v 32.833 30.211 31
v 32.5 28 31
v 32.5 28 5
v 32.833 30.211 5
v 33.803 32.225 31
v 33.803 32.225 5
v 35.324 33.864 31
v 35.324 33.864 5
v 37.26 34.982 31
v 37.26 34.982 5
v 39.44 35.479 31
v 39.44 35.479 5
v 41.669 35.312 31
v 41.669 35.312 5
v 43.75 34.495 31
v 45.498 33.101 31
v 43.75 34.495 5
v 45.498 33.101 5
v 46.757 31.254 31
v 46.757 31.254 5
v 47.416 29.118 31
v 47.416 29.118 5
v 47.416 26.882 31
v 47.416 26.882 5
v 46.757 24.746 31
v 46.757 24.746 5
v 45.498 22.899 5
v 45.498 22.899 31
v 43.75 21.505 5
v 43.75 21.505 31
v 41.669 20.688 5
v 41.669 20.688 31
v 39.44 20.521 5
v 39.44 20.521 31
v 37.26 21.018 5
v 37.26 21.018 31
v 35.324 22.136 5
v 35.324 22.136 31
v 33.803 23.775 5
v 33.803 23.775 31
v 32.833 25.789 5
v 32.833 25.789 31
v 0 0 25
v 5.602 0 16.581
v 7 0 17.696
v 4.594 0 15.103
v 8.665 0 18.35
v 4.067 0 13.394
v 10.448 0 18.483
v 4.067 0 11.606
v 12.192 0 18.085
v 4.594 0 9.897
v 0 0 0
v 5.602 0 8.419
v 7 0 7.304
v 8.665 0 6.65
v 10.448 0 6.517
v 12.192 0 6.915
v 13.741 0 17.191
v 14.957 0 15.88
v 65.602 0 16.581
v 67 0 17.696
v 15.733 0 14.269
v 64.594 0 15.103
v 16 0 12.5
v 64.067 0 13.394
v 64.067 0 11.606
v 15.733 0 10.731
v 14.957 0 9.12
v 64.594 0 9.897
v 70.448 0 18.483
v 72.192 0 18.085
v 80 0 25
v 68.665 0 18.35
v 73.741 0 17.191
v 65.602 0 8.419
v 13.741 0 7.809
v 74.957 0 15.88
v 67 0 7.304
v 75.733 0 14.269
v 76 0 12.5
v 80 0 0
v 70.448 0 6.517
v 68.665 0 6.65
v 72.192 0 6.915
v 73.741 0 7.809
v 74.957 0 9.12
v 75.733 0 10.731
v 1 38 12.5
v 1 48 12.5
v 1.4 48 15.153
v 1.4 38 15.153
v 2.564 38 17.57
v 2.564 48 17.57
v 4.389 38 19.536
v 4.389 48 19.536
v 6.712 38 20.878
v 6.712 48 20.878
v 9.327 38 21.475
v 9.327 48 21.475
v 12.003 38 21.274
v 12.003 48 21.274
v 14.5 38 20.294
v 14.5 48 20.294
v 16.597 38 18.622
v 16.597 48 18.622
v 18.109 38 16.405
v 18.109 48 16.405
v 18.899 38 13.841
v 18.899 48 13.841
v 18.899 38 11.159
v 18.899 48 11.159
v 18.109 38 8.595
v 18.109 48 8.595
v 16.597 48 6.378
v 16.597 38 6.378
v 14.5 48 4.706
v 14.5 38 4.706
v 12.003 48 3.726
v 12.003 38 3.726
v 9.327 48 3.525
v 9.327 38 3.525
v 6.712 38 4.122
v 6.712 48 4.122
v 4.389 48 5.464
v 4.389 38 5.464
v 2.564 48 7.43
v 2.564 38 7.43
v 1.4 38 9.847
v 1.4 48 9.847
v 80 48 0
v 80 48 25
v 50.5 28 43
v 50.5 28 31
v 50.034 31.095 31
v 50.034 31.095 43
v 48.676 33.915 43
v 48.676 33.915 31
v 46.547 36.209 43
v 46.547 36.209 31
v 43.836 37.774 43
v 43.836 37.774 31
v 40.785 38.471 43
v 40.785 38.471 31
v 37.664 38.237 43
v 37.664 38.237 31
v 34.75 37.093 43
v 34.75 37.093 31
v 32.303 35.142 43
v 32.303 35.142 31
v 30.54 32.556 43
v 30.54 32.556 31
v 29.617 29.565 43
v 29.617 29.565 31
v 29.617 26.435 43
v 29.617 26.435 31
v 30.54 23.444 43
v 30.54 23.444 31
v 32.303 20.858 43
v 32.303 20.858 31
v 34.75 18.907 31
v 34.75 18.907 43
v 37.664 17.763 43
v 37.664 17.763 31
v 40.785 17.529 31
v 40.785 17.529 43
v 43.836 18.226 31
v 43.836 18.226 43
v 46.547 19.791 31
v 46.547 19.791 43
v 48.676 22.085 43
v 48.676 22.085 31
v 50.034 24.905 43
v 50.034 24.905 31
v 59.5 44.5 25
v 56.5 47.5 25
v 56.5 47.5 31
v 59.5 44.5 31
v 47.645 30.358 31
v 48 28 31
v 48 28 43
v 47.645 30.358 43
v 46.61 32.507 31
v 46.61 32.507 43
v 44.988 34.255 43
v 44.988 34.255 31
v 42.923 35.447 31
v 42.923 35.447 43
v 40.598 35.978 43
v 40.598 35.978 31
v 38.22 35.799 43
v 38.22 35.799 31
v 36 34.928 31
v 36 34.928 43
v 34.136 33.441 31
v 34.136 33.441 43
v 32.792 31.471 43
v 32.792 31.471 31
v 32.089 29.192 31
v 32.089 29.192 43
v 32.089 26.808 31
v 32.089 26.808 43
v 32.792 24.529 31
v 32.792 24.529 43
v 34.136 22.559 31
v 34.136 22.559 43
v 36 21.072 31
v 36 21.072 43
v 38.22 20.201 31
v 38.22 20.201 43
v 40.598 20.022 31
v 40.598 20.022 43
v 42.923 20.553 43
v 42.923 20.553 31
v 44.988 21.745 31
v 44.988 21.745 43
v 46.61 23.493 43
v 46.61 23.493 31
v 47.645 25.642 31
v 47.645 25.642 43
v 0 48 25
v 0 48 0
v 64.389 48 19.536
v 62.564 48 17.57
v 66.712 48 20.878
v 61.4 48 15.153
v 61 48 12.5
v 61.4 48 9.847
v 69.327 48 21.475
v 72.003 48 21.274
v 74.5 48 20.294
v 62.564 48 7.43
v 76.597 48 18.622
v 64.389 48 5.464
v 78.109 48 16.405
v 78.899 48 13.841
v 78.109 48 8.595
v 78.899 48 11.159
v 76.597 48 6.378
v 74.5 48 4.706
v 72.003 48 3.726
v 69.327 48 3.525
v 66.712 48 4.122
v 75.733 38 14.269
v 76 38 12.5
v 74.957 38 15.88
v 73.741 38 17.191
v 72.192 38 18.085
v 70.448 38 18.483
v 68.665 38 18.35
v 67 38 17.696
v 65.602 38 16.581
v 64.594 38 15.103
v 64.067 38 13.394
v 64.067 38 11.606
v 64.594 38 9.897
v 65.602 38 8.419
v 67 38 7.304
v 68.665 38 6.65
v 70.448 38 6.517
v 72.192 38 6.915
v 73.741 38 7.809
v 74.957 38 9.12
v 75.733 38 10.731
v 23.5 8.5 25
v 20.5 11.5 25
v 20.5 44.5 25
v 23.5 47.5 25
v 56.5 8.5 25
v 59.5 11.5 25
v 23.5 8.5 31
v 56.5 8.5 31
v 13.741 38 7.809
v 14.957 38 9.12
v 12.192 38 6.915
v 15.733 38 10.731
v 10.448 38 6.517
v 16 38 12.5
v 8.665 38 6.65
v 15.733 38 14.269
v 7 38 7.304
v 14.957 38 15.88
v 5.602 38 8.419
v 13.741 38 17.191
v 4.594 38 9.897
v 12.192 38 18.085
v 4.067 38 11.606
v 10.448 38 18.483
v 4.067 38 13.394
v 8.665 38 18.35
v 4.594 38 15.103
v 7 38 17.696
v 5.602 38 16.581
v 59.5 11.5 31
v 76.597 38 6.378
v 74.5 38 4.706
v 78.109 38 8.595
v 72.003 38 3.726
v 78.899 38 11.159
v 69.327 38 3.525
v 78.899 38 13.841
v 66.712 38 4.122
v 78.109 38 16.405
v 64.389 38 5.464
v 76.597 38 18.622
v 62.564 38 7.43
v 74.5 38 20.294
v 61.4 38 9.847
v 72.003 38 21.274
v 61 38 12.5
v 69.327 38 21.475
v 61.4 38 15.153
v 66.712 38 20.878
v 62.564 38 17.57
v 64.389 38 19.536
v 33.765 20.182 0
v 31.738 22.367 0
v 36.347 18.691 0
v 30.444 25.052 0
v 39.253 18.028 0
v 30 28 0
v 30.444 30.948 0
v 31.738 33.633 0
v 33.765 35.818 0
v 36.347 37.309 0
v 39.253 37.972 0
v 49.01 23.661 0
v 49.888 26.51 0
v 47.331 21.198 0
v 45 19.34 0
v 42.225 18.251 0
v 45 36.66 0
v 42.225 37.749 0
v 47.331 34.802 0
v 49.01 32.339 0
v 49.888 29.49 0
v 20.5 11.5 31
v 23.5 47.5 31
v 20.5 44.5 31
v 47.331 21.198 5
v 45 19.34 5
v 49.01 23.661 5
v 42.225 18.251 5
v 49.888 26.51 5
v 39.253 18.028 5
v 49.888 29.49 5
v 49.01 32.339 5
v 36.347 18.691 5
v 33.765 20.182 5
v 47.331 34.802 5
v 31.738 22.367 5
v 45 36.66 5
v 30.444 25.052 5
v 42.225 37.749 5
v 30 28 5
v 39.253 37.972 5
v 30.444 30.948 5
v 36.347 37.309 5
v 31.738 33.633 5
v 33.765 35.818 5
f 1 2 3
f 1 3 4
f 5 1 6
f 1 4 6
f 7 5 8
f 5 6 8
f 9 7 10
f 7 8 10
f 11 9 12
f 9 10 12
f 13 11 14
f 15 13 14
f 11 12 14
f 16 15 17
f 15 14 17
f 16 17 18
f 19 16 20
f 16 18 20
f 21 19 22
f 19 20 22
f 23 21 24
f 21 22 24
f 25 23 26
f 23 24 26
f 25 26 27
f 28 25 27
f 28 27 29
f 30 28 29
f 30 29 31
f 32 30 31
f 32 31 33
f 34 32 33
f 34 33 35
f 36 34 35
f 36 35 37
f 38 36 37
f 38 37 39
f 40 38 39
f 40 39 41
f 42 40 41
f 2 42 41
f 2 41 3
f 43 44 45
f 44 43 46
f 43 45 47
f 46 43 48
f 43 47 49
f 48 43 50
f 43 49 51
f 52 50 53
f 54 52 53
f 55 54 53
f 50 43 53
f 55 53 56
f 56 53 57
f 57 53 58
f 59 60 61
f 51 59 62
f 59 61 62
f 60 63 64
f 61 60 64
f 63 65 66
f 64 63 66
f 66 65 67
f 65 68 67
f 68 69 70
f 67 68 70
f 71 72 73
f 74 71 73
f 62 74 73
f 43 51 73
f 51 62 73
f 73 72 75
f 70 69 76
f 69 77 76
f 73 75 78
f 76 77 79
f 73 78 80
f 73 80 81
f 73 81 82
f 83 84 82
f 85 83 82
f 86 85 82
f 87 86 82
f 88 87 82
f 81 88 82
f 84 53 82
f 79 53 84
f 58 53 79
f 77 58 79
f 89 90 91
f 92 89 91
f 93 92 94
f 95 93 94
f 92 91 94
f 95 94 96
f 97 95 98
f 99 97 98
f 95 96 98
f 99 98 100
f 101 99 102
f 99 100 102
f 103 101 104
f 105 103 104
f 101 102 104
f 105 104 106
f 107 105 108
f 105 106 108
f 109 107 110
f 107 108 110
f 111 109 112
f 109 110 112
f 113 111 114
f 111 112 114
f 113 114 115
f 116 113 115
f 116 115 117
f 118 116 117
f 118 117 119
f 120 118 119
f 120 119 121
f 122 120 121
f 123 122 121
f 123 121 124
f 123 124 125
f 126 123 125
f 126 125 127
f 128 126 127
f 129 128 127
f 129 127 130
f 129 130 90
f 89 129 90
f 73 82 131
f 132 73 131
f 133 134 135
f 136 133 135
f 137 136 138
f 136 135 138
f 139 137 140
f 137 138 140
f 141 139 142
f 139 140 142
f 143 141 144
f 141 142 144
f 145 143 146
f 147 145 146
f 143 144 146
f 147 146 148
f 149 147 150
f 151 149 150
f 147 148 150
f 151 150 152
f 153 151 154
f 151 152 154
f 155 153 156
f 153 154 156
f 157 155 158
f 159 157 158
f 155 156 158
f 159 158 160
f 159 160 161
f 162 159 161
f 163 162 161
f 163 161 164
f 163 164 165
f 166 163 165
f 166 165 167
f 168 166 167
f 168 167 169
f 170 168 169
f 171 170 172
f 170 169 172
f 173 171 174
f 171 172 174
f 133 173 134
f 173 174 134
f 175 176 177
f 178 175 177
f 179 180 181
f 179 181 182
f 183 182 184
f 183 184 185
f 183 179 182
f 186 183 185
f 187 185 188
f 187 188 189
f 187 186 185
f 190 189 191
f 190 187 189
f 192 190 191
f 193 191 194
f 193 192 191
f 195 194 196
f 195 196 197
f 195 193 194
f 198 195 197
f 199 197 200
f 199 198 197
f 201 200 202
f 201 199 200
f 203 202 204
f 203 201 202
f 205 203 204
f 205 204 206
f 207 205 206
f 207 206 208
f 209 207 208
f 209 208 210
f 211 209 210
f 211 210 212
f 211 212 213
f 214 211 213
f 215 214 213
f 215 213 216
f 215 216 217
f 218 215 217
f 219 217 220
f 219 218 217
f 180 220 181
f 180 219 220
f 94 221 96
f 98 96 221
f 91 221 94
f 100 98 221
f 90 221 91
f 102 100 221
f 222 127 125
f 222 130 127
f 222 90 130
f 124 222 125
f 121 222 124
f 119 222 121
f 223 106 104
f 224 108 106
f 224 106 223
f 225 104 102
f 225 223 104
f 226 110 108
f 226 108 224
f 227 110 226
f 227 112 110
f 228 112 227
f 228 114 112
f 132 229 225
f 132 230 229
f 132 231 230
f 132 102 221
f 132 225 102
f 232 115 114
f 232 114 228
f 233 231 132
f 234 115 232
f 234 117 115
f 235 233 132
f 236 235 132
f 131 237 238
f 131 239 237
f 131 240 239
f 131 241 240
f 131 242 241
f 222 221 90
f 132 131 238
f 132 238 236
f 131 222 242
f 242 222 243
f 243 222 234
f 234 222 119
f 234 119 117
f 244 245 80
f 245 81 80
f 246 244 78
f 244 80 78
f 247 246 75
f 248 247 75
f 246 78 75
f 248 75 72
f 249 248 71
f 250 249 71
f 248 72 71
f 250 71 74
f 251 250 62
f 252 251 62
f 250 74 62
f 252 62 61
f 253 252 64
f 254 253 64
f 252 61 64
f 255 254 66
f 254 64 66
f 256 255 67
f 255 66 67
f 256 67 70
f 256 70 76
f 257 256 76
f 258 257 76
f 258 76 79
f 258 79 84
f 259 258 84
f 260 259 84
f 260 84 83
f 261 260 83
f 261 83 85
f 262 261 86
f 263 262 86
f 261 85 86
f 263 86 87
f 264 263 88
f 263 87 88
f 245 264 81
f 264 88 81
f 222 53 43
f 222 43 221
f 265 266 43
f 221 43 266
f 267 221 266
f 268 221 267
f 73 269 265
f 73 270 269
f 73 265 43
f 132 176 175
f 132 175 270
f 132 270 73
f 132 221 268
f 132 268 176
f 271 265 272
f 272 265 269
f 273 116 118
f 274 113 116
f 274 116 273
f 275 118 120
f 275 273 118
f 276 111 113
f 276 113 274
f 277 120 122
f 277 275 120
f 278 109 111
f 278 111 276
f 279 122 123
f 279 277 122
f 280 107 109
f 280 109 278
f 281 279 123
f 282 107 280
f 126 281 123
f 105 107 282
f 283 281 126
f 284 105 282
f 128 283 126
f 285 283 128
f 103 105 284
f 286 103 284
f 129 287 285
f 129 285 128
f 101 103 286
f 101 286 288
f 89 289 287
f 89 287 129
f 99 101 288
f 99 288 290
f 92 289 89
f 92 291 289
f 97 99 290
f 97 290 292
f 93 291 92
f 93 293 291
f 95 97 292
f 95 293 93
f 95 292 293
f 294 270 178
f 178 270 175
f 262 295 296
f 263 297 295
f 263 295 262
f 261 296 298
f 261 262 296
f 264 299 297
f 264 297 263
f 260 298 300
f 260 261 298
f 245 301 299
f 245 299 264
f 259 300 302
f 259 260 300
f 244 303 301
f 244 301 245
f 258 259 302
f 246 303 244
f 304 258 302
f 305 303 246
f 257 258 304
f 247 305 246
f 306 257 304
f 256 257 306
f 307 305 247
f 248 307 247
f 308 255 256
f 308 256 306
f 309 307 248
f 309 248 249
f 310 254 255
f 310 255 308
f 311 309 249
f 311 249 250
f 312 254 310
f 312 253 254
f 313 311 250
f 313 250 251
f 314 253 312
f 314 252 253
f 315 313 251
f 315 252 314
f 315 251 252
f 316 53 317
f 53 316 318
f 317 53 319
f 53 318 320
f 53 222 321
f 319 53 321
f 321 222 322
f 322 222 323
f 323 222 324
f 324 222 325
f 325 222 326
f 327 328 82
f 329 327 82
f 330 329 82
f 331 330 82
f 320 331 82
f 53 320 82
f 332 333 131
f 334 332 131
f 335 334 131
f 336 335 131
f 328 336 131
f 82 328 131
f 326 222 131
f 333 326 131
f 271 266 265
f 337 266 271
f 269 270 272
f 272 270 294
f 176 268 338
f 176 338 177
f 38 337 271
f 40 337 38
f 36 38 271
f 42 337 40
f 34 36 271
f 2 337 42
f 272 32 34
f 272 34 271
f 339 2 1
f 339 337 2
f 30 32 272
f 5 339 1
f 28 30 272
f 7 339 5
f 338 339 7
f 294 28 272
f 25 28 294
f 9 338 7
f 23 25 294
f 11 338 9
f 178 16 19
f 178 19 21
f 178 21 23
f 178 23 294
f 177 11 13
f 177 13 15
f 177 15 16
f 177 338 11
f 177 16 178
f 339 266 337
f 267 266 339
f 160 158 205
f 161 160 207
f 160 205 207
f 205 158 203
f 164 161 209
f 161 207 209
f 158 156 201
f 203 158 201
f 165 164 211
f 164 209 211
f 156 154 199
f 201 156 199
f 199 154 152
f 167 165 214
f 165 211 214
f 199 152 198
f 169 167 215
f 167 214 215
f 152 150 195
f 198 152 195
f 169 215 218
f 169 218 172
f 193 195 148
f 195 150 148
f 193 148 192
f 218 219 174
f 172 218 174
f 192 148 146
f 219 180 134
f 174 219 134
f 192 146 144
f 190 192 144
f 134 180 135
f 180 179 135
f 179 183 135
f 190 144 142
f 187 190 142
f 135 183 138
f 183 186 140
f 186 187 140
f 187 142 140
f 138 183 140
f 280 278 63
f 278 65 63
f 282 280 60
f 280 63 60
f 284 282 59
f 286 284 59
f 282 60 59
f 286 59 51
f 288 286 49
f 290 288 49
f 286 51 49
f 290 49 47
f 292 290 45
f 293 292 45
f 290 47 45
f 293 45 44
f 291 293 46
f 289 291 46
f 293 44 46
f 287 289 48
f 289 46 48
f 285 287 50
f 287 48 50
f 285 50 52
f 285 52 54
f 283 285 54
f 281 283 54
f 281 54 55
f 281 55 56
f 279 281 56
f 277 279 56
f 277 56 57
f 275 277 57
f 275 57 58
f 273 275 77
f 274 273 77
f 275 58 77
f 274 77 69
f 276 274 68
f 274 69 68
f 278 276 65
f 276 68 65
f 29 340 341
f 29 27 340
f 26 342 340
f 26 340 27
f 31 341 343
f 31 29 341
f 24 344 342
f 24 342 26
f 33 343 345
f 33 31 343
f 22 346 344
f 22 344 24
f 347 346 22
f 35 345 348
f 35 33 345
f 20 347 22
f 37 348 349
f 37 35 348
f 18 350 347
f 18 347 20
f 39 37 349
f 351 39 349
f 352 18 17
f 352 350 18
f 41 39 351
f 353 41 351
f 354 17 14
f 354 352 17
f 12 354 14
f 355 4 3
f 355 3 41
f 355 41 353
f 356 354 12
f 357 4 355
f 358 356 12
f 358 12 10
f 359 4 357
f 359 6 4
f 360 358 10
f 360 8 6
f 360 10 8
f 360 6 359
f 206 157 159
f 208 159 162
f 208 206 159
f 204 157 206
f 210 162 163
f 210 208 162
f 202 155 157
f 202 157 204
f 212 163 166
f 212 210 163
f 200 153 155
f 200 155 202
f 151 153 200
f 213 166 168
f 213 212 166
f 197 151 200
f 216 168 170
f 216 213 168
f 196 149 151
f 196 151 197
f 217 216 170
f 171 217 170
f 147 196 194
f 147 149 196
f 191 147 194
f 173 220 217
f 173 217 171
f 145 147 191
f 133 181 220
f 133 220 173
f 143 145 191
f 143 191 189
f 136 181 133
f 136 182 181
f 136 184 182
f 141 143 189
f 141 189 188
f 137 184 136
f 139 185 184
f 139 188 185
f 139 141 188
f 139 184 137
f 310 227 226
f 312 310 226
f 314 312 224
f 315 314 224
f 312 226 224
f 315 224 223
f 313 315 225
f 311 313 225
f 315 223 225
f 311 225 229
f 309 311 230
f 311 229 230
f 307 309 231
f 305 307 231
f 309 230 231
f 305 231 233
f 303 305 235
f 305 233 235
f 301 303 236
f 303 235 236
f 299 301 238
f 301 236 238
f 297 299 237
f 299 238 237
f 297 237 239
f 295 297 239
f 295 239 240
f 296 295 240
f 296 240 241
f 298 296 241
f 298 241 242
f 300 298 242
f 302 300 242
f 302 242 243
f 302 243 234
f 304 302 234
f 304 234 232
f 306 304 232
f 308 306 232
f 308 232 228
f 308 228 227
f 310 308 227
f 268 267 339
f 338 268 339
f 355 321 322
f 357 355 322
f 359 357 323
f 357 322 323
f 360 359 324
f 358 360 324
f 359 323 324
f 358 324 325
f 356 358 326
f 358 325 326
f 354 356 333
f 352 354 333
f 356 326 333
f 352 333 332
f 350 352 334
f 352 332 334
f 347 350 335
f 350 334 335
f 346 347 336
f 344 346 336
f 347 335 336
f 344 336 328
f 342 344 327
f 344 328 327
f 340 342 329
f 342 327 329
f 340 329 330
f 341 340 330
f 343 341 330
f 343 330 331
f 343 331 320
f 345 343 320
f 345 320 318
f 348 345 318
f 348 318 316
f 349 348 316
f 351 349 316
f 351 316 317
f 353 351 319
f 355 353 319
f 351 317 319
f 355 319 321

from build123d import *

# Parameters (mm, degrees)
SKETCH_1_W                    = 80
SKETCH_1_H                    = 48
EXTRUDE_1_DEPTH               = 25
SKETCH_2_W                    = 39
SKETCH_2_H                    = 39
EXTRUDE_2_DEPTH               = 6
CHAMFER_1_SIZE                = 3
SKETCH_3_R                    = 7.5
CUT_EXTRUDE_1_DEPTH           = 99.310731866
SKETCH_4_R                    = 10
CUT_EXTRUDE_2_DEPTH           = 5
HOLE_WIZARD_M10_1_D           = 12
HOLE_WIZARD_M10_1_CBORE_D     = 18
HOLE_WIZARD_M10_1_CBORE_DEPTH = 10
SKETCH_8_R                    = 10.5
SKETCH_8_R_2                  = 8
EXTRUDE_4_DEPTH               = 12


with BuildPart() as part:
    # 草图1 → 凸台-拉伸1 (new body)
    with BuildSketch(Plane.XY):
        with Locations((40, 24)):
            Rectangle(SKETCH_1_W, SKETCH_1_H)
    extrude(amount=EXTRUDE_1_DEPTH)

    # 草图2 → 凸台-拉伸2 (add)
    with BuildSketch(Plane.XY.offset(25)):
        with Locations((40, 28)):
            Rectangle(SKETCH_2_W, SKETCH_2_H)
    extrude(amount=EXTRUDE_2_DEPTH)

    # 倒角1
    chamfer_1_edges = [part.edges().sort_by_distance(p)[0] for p in [
        (20.5, 47.5, 28),
        (20.5, 8.5, 28),
        (59.5, 8.5, 28),
        (59.5, 47.5, 28),
    ]]
    chamfer(chamfer_1_edges, length=CHAMFER_1_SIZE)

    # 草图3 → 切除-拉伸1 (cut, through all)
    with BuildSketch(Plane(origin=(0, 0, 0), x_dir=(-1, 0, 0), z_dir=(0, 0, -1))):
        with Locations((-40, 28)):
            Circle(SKETCH_3_R)
    extrude(amount=-CUT_EXTRUDE_1_DEPTH, mode=Mode.SUBTRACT)

    # 草图4 → 切除-拉伸2 (cut)
    with BuildSketch(Plane(origin=(0, 0, 0), x_dir=(-1, 0, 0), z_dir=(0, 0, -1))):
        with Locations((-40, 28)):
            Circle(SKETCH_4_R)
    extrude(amount=-CUT_EXTRUDE_2_DEPTH, mode=Mode.SUBTRACT)

    # M10 六角凹头螺钉的柱形沉头孔1 (through all)
    with Locations(Plane(origin=(0, 48, 0), x_dir=(-1, 0, 0), z_dir=(0, 1, 0))):
        with Locations((-70, 12.5), (-10, 12.5)):
            CounterBoreHole(HOLE_WIZARD_M10_1_D / 2, HOLE_WIZARD_M10_1_CBORE_D / 2, HOLE_WIZARD_M10_1_CBORE_DEPTH)


with BuildPart() as body_2:
    # 草图8 → 凸台-拉伸4 (new body)
    with BuildSketch(Plane.XY.offset(31)):
        with Locations((40, 28)):
            Circle(SKETCH_8_R)
        with Locations((40, 28)):
            Circle(SKETCH_8_R_2, mode=Mode.SUBTRACT)
    extrude(amount=EXTRUDE_4_DEPTH)


solid = Compound([part.part, body_2.part])
